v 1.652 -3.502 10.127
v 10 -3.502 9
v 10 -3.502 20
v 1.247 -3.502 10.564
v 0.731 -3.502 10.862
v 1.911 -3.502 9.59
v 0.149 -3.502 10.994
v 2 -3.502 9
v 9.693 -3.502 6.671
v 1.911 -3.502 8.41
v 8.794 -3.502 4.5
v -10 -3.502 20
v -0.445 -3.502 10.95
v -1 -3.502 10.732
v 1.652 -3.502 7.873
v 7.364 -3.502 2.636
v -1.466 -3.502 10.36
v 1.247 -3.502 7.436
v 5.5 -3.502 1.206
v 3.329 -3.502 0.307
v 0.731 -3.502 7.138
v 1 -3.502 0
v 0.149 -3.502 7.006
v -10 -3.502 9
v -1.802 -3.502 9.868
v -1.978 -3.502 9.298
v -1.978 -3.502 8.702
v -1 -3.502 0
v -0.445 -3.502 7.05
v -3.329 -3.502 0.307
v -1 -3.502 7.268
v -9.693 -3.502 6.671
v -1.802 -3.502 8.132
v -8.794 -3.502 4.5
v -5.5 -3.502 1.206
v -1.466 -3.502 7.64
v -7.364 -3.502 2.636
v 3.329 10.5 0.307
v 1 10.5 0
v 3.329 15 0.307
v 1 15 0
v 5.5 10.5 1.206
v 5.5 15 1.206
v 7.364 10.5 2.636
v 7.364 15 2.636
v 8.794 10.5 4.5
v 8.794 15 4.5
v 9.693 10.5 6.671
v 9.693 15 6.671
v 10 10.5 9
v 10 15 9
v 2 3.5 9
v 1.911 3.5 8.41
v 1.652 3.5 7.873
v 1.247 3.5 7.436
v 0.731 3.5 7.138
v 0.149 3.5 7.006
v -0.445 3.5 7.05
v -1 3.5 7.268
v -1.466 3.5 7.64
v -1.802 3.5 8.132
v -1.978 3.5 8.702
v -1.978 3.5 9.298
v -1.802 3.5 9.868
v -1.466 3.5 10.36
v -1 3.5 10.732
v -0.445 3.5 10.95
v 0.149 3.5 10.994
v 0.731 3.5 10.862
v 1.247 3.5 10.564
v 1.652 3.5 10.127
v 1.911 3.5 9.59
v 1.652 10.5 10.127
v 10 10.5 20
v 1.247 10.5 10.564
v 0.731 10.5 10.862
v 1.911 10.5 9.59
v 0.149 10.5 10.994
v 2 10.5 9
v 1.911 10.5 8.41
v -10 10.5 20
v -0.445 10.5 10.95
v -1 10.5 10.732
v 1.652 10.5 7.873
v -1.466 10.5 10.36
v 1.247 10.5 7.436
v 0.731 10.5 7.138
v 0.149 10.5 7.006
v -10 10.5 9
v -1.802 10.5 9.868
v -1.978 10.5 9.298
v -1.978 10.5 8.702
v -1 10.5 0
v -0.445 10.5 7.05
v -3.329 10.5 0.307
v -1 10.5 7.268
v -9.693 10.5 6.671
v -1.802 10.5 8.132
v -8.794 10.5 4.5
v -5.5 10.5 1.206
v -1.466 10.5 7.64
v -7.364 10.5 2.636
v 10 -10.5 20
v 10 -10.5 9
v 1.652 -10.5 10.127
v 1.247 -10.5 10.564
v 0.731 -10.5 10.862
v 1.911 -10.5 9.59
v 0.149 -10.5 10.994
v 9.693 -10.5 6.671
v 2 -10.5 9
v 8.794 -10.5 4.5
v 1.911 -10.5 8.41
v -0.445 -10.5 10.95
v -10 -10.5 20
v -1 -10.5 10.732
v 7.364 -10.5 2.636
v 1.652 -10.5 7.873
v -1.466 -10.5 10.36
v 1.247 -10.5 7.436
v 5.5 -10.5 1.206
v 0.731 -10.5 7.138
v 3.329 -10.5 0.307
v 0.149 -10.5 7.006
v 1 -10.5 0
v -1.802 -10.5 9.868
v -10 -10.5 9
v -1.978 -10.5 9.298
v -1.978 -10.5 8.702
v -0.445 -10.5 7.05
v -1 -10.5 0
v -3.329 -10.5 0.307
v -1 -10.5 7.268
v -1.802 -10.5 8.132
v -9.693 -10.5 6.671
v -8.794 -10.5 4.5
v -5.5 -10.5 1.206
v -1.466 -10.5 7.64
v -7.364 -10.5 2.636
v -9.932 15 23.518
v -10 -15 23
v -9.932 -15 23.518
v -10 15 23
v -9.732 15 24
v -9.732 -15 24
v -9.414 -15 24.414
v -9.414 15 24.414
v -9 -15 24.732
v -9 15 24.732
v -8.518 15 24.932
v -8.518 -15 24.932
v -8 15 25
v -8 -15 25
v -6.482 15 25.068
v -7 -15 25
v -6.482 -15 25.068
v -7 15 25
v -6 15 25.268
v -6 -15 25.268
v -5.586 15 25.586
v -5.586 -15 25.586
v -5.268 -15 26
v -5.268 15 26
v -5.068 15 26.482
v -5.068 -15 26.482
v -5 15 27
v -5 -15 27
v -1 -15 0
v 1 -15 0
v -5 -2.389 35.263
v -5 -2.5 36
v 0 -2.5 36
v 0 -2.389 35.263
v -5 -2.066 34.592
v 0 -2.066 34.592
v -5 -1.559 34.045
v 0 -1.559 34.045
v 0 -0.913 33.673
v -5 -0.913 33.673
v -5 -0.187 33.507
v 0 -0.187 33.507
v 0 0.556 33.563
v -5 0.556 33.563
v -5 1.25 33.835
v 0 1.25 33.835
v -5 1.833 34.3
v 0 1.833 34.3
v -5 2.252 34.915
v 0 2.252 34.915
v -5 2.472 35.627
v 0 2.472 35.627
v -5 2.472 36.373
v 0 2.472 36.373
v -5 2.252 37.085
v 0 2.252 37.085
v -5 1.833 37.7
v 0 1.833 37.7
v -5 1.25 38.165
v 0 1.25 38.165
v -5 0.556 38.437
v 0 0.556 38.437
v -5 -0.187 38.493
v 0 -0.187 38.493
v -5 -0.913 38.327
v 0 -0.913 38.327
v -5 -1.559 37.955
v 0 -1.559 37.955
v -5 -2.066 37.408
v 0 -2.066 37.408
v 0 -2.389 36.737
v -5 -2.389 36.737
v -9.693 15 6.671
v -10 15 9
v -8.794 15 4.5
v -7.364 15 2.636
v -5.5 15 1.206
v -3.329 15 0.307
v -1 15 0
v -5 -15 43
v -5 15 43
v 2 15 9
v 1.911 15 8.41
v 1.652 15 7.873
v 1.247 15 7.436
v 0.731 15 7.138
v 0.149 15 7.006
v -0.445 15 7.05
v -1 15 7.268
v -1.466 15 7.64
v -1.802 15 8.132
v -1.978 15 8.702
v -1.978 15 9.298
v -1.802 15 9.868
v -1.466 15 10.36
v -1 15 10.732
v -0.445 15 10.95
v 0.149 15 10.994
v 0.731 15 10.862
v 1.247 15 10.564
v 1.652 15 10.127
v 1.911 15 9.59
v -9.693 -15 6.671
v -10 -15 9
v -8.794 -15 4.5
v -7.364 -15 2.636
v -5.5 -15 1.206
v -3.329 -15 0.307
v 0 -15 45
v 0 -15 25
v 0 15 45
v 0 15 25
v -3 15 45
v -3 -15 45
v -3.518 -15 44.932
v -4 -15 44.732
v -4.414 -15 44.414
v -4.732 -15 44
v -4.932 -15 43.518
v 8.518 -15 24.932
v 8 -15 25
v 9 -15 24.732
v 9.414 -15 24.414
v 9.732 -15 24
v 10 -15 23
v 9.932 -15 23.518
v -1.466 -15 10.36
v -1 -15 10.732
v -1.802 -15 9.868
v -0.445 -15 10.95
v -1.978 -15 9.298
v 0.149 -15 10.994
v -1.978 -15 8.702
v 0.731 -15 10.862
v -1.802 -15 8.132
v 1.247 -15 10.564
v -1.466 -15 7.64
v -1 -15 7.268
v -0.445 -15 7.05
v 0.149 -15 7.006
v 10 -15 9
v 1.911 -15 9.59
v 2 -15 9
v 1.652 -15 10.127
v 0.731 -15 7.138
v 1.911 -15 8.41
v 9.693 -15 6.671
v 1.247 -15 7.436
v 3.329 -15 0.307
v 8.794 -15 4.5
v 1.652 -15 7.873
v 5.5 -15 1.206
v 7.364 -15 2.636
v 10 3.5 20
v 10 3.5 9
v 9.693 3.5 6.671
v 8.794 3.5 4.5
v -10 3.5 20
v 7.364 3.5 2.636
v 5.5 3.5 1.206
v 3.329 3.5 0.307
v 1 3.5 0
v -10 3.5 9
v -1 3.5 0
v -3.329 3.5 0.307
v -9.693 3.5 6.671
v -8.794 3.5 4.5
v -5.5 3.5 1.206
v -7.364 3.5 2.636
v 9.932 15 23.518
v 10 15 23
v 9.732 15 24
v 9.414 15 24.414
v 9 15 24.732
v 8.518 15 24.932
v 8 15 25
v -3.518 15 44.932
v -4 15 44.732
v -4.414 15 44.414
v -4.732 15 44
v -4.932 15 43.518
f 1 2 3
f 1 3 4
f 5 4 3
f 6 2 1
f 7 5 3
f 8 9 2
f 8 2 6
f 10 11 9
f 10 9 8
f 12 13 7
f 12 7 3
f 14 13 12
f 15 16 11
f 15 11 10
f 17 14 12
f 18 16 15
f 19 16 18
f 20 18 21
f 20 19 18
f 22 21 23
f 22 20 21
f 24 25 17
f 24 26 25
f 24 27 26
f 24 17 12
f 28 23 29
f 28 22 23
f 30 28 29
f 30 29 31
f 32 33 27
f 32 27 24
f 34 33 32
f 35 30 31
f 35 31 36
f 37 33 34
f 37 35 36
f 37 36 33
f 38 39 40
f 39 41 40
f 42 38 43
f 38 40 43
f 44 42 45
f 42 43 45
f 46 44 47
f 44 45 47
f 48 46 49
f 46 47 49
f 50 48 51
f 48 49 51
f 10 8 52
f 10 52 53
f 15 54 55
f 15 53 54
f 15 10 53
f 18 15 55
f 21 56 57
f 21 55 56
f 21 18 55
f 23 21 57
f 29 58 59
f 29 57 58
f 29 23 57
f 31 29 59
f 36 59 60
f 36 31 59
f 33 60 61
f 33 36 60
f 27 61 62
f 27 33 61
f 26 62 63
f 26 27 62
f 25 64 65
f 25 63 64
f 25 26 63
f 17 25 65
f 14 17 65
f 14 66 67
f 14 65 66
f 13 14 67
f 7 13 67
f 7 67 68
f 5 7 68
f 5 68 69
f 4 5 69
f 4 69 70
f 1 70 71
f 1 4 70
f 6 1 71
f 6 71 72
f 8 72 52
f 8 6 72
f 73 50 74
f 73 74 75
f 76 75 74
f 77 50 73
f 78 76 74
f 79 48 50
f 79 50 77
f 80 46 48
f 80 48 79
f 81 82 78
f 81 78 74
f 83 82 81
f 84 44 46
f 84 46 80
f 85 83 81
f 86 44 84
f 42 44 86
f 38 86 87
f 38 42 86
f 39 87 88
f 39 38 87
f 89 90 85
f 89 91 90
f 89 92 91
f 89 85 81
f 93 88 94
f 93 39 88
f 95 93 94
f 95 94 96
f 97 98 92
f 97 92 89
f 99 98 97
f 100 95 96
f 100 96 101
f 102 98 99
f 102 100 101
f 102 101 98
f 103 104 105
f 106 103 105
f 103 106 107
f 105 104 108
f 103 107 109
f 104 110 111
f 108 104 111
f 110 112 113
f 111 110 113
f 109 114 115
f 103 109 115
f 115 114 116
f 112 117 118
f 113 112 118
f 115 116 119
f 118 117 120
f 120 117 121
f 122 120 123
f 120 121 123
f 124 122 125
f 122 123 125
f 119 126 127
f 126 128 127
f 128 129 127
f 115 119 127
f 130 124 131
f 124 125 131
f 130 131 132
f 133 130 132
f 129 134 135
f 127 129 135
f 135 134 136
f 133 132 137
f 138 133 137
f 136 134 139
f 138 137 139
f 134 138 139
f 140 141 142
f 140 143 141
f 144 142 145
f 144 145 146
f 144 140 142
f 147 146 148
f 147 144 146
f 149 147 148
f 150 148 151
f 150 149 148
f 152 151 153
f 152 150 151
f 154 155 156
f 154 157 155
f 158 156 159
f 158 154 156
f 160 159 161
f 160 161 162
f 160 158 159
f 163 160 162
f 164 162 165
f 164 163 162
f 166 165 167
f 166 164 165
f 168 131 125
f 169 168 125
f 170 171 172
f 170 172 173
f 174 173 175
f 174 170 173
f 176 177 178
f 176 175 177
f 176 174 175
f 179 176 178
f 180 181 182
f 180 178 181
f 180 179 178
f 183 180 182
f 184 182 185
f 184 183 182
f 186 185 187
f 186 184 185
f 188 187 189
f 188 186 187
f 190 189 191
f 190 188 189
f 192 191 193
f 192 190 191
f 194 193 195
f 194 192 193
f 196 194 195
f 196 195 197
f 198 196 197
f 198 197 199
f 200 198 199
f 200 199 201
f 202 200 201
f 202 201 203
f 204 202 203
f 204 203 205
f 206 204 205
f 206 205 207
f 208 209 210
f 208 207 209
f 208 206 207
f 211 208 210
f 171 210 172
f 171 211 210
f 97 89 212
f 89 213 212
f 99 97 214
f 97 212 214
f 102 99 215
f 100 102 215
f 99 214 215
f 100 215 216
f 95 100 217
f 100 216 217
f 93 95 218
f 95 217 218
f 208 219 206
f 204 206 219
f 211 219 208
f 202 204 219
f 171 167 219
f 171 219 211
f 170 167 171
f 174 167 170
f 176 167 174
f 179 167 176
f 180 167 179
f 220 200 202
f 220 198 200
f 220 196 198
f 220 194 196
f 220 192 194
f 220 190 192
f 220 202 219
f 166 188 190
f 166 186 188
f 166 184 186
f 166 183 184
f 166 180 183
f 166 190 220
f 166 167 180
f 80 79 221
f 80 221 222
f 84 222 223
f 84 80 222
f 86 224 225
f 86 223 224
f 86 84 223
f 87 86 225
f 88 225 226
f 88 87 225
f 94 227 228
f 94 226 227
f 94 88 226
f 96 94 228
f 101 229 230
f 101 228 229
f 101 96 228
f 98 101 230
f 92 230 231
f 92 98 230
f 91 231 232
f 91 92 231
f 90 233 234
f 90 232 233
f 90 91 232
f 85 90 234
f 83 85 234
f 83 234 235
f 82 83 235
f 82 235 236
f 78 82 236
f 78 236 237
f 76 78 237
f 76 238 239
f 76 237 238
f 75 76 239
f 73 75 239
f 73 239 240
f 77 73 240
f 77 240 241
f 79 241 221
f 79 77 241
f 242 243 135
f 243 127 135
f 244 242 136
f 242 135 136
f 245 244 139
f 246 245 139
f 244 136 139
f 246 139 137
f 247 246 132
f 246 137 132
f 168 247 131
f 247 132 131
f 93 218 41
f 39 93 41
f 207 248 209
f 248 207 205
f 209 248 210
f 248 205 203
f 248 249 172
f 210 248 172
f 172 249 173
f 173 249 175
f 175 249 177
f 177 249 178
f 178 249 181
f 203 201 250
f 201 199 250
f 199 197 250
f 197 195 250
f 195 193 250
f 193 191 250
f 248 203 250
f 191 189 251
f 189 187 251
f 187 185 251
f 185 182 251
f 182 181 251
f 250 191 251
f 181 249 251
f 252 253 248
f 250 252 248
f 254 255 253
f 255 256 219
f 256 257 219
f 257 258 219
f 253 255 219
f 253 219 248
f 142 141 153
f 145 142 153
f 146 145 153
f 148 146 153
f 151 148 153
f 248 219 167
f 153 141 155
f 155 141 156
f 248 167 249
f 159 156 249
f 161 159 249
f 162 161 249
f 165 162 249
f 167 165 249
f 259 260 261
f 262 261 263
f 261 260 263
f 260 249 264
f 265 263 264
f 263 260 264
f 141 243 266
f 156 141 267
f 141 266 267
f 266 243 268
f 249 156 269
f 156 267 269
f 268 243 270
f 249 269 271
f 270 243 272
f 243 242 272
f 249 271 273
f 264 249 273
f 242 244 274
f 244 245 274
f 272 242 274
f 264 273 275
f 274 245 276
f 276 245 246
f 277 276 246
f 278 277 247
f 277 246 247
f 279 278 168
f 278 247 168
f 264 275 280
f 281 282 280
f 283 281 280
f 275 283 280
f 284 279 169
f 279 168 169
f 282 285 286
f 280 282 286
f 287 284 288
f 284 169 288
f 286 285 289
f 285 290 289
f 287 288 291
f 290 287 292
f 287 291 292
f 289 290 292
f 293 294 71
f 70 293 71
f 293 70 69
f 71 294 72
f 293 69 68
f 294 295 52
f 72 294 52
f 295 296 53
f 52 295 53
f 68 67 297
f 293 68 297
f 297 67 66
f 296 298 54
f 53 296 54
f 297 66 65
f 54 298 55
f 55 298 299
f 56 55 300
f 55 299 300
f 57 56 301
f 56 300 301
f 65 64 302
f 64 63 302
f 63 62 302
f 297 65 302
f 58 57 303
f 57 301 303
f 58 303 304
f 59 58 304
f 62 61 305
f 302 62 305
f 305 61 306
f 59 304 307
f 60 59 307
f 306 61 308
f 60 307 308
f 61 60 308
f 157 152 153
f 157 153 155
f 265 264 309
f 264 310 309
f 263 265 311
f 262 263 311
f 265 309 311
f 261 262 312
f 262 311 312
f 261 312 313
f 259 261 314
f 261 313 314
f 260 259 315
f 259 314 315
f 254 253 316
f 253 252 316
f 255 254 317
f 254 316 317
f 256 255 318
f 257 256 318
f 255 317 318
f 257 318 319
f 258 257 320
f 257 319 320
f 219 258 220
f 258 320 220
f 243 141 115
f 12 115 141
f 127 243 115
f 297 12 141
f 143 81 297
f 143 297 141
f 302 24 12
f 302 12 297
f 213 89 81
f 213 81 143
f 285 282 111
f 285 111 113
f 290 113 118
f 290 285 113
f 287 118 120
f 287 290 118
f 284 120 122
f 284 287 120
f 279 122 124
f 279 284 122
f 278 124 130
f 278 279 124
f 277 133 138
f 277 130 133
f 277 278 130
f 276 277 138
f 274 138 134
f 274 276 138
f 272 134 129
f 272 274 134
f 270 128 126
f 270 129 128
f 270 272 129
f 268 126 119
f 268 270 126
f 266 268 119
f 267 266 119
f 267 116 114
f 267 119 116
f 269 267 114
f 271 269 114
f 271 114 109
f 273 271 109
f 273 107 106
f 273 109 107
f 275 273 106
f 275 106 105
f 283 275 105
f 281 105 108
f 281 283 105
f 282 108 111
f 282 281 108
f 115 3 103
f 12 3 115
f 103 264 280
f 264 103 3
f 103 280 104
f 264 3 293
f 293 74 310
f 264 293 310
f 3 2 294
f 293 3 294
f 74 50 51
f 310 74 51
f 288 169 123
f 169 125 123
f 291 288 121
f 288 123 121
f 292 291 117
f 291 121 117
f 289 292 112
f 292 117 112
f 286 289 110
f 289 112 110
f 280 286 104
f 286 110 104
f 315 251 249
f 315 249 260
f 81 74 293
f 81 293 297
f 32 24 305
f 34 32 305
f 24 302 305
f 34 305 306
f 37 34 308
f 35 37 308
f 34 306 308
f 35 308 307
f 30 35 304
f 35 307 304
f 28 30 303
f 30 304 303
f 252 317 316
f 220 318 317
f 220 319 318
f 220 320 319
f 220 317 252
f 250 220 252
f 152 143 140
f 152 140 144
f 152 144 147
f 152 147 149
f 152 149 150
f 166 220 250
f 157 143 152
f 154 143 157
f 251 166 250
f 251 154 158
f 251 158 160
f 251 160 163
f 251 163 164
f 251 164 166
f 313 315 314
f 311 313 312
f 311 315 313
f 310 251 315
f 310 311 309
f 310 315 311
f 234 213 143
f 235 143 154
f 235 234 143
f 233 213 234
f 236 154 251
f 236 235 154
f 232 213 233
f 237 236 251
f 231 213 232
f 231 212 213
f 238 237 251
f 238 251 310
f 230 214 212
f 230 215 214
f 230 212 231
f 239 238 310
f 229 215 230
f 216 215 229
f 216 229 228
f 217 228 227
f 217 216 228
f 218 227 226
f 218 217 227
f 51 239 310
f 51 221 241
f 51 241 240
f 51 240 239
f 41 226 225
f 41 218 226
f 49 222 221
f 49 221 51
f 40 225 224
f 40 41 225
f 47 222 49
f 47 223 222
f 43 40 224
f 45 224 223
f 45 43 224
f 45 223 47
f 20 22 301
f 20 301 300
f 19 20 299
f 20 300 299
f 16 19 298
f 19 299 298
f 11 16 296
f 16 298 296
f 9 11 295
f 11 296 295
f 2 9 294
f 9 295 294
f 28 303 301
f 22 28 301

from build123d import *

# Parameters (mm, degrees)
SKETCH1_W               = 20
SKETCH1_H               = 30
BOSS_EXTRUDE1_DEPTH     = 25
SKETCH2_W               = 20
SKETCH2_H               = 7
SKETCH2_H_2             = 6.997545124
CUT_EXTRUDE1_DEPTH      = 20
SKETCH3_W               = 5
SKETCH3_H               = 30
BOSS_EXTRUDE3_DEPTH     = 20
CUT_EXTRUDE2_DEPTH      = 13
CUT_EXTRUDE2_DEPTH_BACK = 16
SKETCH5_R               = 2.5
FILLET1_R               = 9
CUT_EXTRUDE3_DEPTH      = 11
CUT_EXTRUDE3_DEPTH_BACK = 33
SKETCH6_R               = 2
FILLET2_R               = 2
FILLET3_R               = 2
FILLET4_R               = 2


with BuildPart() as part:
    # Sketch1 → Boss-Extrude1 (new body)
    with BuildSketch(Plane.XY):
        Rectangle(SKETCH1_W, SKETCH1_H)
    extrude(amount=BOSS_EXTRUDE1_DEPTH)

    # Sketch2 → Cut-Extrude1 (cut)
    with BuildSketch(Plane(origin=(0, 0, 0), x_dir=(-1, 0, 0), z_dir=(0, 0, -1))):
        with Locations((0, 7)):
            Rectangle(SKETCH2_W, SKETCH2_H)
        with Locations((0, -7.001227438)):
            Rectangle(SKETCH2_W, SKETCH2_H_2)
    extrude(amount=-CUT_EXTRUDE1_DEPTH, mode=Mode.SUBTRACT)

    # Sketch3 → Boss-Extrude3 (add)
    with BuildSketch(Plane.XY.offset(25)):
        with Locations((-2.5, 0)):
            Rectangle(SKETCH3_W, SKETCH3_H)
    extrude(amount=BOSS_EXTRUDE3_DEPTH)

    # Sketch5 → Cut-Extrude2 (cut, two sides: drawn at the far end of the back side and taken through both)
    with BuildSketch(Plane(origin=(0, 0, 0), x_dir=(0, 0, -1), z_dir=(1, 0, 0)).offset(-CUT_EXTRUDE2_DEPTH_BACK)):
        with Locations(Location((-36, 0, 0), (0, 0, 270))):
            Circle(SKETCH5_R)
    extrude(amount=CUT_EXTRUDE2_DEPTH + CUT_EXTRUDE2_DEPTH_BACK, mode=Mode.SUBTRACT)

    # Fillet1
    fillet1_edges = [part.edges().sort_by_distance(p)[0] for p in [
        (10, -0.001227438, 0),
        (10, 12.75, 0),
        (-10, -0.001227438, 0),
        (-10, -12.75, 0),
        (-10, 12.75, 0),
        (10, -12.75, 0),
    ]]
    fillet(fillet1_edges, radius=FILLET1_R)

    # Sketch6 → Cut-Extrude3 (cut, two sides: drawn at the far end of the back side and taken through both)
    with BuildSketch(Plane(origin=(0, 15, 0), x_dir=(1, 0, 0), z_dir=(0, 1, 0)).offset(-CUT_EXTRUDE3_DEPTH_BACK)):
        with Locations((0, -9)):
            Circle(SKETCH6_R)
    extrude(amount=CUT_EXTRUDE3_DEPTH + CUT_EXTRUDE3_DEPTH_BACK, mode=Mode.SUBTRACT)

    # Fillet2
    fillet2_edges = [part.edges().sort_by_distance(p)[0] for p in [
        (-10, 0, 25),
        (-5, 0, 25),
    ]]
    fillet(fillet2_edges, radius=FILLET2_R)

    # Fillet3
    fillet3_edges = [part.edges().sort_by_distance(p)[0] for p in [
        (10, 0, 25),
    ]]
    fillet(fillet3_edges, radius=FILLET3_R)

    # Fillet4
    fillet4_edges = [part.edges().sort_by_distance(p)[0] for p in [
        (-5, 0, 45),
    ]]
    fillet(fillet4_edges, radius=FILLET4_R)


solid = part.part
